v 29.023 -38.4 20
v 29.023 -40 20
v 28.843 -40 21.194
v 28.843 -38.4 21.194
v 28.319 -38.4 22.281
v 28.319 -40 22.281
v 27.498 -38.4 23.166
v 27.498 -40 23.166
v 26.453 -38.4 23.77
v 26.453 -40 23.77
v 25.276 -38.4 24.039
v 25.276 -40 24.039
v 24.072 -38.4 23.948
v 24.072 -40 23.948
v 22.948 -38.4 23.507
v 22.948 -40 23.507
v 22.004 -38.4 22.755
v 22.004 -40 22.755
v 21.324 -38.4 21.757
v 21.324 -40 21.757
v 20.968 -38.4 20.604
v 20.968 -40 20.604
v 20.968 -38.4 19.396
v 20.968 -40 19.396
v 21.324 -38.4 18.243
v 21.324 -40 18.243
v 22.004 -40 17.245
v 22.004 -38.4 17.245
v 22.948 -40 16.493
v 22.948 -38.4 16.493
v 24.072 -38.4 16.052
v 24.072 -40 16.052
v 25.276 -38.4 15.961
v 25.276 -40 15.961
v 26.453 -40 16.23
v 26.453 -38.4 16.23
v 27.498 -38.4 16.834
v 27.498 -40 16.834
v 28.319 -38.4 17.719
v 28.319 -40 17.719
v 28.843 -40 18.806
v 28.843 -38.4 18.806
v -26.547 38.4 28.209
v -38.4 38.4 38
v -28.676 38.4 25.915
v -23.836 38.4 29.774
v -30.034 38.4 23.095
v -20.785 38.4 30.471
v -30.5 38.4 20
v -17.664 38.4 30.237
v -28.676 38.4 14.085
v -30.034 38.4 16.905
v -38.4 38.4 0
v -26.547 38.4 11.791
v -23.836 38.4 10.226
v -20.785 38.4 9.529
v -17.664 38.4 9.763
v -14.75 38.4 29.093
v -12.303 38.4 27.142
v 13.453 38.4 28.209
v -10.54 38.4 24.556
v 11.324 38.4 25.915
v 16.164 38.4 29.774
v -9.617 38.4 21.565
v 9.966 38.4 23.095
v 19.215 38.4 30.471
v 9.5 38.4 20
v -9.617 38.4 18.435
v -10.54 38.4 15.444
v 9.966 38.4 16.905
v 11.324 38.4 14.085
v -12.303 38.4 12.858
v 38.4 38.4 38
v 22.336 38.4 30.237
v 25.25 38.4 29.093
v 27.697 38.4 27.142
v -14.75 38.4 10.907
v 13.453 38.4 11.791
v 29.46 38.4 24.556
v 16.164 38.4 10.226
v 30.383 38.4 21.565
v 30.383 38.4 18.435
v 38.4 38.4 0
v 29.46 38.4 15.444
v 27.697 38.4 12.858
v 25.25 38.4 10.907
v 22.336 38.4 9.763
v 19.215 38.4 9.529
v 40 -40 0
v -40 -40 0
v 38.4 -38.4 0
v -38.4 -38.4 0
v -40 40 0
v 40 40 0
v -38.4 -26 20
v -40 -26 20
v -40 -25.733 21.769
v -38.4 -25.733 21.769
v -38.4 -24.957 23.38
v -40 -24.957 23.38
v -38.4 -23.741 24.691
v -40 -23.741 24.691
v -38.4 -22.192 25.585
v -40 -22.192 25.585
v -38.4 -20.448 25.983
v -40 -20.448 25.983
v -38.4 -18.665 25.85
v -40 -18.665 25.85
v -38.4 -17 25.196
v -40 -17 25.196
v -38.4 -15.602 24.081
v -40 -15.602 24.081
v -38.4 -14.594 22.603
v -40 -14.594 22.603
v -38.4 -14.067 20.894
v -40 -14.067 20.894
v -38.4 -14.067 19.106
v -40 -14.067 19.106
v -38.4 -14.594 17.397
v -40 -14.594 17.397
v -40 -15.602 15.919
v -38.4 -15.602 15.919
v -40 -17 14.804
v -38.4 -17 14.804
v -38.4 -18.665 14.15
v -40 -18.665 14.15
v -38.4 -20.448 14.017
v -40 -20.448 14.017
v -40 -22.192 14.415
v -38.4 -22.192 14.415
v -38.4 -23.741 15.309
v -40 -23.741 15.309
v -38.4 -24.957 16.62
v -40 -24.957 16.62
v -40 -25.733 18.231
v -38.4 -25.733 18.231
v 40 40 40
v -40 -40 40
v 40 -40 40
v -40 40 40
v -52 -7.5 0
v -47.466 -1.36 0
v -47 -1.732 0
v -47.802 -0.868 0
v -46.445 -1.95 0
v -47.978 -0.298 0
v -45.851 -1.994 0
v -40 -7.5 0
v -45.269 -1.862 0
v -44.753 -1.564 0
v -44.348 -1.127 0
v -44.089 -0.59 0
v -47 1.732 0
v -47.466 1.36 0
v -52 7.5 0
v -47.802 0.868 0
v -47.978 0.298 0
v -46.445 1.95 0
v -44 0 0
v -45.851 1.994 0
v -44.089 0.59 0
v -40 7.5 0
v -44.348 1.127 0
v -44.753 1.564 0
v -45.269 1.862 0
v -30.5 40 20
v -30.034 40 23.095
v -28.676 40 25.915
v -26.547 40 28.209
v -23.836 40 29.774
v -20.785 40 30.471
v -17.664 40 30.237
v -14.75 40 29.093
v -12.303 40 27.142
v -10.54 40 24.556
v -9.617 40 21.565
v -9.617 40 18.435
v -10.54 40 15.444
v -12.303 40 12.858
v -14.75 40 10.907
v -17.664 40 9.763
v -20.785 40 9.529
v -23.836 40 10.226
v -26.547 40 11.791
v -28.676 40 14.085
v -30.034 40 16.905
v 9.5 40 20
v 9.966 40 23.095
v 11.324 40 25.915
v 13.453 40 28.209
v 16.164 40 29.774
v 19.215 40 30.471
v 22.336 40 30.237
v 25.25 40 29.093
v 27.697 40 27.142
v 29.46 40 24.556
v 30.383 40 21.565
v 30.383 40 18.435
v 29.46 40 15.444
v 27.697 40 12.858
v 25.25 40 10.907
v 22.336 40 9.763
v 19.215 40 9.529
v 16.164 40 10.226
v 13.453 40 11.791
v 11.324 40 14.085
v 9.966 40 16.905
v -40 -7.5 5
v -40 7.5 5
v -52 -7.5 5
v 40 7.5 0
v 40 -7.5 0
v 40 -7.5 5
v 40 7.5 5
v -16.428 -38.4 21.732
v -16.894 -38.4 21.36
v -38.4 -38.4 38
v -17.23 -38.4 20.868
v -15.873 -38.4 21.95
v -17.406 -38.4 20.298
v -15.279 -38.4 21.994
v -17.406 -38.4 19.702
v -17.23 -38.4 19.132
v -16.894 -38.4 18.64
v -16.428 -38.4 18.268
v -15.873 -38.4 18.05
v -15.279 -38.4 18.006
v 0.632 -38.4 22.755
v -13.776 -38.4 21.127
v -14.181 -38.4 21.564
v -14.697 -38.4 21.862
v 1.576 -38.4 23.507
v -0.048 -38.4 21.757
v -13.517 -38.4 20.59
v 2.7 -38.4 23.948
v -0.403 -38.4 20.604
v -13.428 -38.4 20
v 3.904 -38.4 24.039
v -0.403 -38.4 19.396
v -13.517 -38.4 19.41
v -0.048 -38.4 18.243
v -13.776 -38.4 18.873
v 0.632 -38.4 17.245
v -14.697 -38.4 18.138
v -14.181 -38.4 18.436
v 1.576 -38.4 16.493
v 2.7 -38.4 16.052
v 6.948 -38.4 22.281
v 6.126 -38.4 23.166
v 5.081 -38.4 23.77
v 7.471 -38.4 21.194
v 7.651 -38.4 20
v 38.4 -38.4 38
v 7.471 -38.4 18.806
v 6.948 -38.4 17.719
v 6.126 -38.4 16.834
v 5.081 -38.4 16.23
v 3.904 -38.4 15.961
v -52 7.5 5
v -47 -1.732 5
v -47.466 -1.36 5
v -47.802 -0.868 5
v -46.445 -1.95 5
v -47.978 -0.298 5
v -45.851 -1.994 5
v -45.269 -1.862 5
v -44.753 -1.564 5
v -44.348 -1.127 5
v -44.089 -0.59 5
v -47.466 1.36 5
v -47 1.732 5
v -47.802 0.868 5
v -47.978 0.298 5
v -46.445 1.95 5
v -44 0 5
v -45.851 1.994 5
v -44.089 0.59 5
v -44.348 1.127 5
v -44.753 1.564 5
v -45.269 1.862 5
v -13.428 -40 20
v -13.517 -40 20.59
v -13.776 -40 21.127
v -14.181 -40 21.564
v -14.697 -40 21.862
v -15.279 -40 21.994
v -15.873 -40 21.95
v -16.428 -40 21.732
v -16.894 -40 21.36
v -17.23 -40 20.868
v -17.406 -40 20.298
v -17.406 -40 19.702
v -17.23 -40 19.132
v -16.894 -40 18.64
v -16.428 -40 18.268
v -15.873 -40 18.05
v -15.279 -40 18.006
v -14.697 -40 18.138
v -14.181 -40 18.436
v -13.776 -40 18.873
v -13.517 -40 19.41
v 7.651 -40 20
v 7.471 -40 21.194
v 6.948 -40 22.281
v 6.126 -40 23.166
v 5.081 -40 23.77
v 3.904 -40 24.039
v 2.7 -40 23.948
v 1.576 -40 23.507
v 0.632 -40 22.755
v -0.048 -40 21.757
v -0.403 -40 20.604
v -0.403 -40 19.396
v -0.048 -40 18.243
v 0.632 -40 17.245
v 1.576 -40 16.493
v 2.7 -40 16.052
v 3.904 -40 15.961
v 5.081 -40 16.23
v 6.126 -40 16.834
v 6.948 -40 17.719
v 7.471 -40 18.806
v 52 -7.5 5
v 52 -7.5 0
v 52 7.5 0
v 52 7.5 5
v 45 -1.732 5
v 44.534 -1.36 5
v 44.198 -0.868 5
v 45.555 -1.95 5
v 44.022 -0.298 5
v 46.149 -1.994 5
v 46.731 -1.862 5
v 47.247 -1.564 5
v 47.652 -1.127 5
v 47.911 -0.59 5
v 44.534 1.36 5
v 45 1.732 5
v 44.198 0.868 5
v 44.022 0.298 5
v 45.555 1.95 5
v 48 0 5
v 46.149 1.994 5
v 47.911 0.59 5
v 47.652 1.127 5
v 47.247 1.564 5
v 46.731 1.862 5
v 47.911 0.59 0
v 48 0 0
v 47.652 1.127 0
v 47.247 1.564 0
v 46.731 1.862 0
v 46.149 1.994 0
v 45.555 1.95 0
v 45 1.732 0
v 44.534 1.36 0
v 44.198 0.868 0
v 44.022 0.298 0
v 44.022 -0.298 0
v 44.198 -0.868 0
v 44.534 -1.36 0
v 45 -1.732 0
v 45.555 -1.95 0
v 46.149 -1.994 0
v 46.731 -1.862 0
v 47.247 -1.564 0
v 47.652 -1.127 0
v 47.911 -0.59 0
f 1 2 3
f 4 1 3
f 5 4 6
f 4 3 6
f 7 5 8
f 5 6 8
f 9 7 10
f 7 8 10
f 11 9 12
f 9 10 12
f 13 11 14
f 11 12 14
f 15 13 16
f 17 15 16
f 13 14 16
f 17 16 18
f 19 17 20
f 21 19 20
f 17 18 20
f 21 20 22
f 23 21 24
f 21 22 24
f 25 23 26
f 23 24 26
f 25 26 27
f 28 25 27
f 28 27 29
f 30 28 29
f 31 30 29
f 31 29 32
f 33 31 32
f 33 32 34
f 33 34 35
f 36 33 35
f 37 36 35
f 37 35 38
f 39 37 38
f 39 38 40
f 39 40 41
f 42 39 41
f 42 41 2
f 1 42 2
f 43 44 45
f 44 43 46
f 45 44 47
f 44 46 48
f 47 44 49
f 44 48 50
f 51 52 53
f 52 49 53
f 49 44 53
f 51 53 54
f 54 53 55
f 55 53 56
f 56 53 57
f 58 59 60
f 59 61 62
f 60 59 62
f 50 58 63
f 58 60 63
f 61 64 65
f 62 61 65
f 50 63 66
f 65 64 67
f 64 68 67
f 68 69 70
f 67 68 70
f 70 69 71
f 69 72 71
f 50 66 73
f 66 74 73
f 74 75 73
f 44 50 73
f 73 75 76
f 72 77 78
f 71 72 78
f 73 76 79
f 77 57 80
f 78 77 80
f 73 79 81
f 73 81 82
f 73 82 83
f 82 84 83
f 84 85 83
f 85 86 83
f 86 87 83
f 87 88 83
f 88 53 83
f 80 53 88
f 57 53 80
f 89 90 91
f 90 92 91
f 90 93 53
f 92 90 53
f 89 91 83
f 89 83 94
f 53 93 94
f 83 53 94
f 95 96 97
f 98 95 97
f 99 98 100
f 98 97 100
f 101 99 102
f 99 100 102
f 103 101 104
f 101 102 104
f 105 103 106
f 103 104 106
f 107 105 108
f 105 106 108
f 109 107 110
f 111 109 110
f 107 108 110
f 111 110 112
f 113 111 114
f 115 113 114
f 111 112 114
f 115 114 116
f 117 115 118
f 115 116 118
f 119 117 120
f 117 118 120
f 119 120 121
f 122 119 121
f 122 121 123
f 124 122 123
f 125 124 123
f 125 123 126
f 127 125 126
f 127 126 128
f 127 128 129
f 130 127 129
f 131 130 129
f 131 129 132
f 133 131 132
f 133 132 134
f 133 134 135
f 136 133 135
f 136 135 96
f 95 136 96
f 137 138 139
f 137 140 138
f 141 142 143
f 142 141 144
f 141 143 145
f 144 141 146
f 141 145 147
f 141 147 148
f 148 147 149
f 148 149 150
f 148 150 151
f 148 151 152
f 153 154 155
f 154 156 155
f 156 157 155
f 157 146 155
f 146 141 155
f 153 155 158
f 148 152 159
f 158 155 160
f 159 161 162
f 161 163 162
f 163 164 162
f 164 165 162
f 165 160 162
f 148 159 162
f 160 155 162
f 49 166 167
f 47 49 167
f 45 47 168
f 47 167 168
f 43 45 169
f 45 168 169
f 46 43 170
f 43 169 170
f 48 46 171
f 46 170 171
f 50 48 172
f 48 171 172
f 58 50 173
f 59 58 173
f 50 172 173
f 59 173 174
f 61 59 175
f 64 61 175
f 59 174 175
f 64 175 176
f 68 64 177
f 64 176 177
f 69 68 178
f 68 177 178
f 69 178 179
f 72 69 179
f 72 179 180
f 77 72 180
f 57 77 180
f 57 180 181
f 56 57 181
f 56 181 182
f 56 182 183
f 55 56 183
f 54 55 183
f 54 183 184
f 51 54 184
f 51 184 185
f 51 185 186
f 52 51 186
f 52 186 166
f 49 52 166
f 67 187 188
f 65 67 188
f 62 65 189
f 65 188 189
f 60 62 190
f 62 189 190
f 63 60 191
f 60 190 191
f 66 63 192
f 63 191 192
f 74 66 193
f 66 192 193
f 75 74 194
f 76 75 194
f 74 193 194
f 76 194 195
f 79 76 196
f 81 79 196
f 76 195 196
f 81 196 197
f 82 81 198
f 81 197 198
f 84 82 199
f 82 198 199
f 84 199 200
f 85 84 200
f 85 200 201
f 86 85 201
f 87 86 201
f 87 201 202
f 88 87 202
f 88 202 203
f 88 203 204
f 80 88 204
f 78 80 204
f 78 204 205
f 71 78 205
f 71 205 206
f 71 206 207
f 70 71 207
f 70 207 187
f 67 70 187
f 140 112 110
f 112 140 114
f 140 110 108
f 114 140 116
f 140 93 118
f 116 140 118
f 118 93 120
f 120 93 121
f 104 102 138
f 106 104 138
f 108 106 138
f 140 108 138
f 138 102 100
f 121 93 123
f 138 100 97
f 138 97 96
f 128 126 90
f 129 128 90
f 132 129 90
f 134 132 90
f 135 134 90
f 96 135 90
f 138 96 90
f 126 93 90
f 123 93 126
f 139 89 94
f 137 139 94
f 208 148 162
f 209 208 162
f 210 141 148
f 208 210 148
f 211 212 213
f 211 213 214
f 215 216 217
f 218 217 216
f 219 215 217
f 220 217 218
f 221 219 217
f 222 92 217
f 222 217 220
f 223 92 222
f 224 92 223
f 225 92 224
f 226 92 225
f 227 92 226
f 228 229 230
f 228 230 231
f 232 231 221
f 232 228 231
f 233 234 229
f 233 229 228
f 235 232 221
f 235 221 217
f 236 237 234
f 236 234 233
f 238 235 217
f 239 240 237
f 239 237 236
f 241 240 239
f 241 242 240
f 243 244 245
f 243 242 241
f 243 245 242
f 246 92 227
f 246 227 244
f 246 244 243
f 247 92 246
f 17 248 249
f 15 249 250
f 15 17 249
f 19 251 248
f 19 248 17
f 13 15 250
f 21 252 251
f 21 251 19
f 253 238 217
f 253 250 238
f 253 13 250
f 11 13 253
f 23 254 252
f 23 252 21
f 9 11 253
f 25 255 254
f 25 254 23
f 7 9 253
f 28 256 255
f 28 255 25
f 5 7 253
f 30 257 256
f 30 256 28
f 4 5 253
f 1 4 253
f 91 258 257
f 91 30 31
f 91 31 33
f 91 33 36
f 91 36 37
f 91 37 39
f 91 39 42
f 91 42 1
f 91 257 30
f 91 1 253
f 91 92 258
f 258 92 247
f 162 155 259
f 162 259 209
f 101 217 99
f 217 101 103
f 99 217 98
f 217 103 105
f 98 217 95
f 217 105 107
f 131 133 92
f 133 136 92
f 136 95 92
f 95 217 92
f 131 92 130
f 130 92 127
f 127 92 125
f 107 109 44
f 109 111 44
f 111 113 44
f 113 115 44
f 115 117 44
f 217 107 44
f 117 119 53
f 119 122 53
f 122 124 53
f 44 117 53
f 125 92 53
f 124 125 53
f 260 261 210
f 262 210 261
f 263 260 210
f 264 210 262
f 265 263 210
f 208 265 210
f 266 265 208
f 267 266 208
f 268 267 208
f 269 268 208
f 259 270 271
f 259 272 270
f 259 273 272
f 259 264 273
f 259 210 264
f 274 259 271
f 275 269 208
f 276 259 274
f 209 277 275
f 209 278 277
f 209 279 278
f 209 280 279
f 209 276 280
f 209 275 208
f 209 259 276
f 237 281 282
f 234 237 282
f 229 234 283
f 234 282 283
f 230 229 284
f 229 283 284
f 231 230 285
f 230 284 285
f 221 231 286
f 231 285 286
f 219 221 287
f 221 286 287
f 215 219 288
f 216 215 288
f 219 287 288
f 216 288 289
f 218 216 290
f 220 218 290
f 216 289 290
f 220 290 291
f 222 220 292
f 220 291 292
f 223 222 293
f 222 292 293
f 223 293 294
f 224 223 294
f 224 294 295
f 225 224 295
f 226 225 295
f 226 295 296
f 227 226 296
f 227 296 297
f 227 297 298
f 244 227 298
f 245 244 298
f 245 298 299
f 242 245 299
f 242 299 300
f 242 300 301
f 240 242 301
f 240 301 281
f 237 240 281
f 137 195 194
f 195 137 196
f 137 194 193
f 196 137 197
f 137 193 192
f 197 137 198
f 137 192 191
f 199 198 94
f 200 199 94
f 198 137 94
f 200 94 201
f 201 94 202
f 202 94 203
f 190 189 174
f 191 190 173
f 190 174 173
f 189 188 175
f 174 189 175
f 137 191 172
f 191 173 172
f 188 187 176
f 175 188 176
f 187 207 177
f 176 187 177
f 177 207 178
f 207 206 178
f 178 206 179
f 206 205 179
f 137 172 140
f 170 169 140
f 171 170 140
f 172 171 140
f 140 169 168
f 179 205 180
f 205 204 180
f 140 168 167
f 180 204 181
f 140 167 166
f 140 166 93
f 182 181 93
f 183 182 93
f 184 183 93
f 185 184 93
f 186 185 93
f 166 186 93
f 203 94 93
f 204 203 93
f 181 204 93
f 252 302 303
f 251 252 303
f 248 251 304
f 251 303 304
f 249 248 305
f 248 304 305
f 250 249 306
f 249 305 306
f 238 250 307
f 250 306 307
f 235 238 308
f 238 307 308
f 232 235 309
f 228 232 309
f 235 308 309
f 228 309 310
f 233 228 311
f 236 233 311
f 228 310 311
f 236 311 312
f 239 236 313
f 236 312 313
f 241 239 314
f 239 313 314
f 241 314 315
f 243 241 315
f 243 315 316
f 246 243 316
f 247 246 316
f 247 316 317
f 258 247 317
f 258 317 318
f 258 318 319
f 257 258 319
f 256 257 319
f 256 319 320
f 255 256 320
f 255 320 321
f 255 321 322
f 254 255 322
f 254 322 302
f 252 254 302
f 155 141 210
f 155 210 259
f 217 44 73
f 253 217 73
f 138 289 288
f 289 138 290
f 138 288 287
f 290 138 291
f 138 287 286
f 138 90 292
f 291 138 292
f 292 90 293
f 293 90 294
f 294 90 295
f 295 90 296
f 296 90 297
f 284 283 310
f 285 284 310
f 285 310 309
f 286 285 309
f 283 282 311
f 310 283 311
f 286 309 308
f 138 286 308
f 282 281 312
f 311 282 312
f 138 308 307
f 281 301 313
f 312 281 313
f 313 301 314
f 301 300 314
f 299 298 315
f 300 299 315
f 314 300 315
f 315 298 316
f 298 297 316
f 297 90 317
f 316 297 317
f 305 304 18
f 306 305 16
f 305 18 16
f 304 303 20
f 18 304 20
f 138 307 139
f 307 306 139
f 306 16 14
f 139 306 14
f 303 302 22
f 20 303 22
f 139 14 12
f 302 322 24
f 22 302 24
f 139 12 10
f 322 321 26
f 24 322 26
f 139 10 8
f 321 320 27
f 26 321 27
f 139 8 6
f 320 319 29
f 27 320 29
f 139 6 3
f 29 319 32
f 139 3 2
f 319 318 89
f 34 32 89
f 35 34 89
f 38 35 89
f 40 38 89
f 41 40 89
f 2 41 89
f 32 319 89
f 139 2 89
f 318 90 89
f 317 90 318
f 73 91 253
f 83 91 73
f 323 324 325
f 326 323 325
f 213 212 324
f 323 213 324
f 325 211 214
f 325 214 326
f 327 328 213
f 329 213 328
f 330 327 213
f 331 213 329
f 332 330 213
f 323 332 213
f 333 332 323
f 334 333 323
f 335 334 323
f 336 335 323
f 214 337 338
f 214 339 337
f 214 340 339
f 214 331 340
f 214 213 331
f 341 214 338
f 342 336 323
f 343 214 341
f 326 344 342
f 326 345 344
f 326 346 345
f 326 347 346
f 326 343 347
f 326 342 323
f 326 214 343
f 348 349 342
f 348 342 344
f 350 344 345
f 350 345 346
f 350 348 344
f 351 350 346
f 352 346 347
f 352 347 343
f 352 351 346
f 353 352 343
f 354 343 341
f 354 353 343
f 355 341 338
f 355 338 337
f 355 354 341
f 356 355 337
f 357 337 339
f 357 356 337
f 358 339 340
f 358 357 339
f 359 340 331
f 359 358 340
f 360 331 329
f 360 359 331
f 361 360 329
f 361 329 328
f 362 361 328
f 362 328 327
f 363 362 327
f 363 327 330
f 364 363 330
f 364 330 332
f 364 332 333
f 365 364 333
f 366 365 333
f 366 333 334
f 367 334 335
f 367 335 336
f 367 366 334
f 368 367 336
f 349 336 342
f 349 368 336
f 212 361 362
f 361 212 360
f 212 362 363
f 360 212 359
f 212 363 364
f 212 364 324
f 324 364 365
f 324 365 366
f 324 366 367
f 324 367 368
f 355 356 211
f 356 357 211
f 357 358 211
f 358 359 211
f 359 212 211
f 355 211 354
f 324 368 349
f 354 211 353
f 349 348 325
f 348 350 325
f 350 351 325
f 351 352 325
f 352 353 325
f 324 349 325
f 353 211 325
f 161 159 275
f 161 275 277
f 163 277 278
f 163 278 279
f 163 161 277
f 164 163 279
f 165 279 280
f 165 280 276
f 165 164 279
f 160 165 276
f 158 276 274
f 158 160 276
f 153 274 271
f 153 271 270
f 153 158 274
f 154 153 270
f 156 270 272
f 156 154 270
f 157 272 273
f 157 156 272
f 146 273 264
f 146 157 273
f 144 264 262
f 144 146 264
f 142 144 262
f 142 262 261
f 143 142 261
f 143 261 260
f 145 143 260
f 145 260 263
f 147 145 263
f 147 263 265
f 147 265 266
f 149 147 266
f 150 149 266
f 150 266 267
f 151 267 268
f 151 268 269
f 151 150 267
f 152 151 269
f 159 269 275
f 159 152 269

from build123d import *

# Parameters (mm, degrees)
F0_W      = 12
F0_H      = 15
F0_R      = 2
F1_DEPTH  = 5
F0_W_2    = 76.8
F0_H_2    = 76.8
F2_DEPTH  = 40
F3_W      = 76.8
F3_H      = 76.8
F4_DEPTH  = 2
F5_R      = 10.5
F6_DEPTH  = 25
F7_R      = 6
F8_DEPTH  = 25
F9_R      = 4.05
F9_R_2    = 2
F10_DEPTH = 25


with BuildPart() as f1:
    # F0 (on Top) → F1 (new body)
    with BuildSketch(Plane.XY):
        with Locations((-46, 0)):
            Rectangle(F0_W, F0_H)
        with Locations((-46, 0)):
            Circle(F0_R, mode=Mode.SUBTRACT)
        with Locations((46, 0)):
            Rectangle(F0_W, F0_H)
        with Locations((46, 0)):
            Circle(F0_R, mode=Mode.SUBTRACT)
    extrude(amount=F1_DEPTH)


with BuildPart() as f2:
    # F0 (on Top) → F2 (new body)
    with BuildSketch(Plane.XY):
        Polygon((-40, -40), (40, -40), (40, -7.5), (40, 7.5), (40, 40), (-40, 40), (-40, 7.5), (-40, -7.5), align=None)
        Rectangle(F0_W_2, F0_H_2, mode=Mode.SUBTRACT)
    extrude(amount=F2_DEPTH)

    # F3 (on face) → F4 (join)
    with BuildSketch(Plane.XY.offset(40)):
        Rectangle(F3_W, F3_H)
    extrude(amount=-F4_DEPTH)

    # F5 (on face) → F6 (cut)
    with BuildSketch(Plane(origin=(0, 40, 0), x_dir=(-1, 0, 0), z_dir=(0, 1, 0))):
        with Locations((-20, 20)):
            Circle(F5_R)
        with Locations((20, 20)):
            Circle(F5_R)
    extrude(amount=-F6_DEPTH, mode=Mode.SUBTRACT)

    # F7 (on face) → F8 (cut)
    with BuildSketch(Plane(origin=(-40, 0, 0), x_dir=(0, -1, 0), z_dir=(-1, 0, 0))):
        with Locations((20, 20)):
            Circle(F7_R)
    extrude(amount=-F8_DEPTH, mode=Mode.SUBTRACT)

    # F9 (on face) → F10 (cut)
    with BuildSketch(Plane.XZ.offset(40)):
        with Locations((24.973074, 20)):
            Circle(F9_R)
        with Locations((3.601355, 20)):
            Circle(F9_R)
        with Locations((-15.428129, 20)):
            Circle(F9_R_2)
    extrude(amount=-F10_DEPTH, mode=Mode.SUBTRACT)


solid = Compound([f1.part, f2.part])
